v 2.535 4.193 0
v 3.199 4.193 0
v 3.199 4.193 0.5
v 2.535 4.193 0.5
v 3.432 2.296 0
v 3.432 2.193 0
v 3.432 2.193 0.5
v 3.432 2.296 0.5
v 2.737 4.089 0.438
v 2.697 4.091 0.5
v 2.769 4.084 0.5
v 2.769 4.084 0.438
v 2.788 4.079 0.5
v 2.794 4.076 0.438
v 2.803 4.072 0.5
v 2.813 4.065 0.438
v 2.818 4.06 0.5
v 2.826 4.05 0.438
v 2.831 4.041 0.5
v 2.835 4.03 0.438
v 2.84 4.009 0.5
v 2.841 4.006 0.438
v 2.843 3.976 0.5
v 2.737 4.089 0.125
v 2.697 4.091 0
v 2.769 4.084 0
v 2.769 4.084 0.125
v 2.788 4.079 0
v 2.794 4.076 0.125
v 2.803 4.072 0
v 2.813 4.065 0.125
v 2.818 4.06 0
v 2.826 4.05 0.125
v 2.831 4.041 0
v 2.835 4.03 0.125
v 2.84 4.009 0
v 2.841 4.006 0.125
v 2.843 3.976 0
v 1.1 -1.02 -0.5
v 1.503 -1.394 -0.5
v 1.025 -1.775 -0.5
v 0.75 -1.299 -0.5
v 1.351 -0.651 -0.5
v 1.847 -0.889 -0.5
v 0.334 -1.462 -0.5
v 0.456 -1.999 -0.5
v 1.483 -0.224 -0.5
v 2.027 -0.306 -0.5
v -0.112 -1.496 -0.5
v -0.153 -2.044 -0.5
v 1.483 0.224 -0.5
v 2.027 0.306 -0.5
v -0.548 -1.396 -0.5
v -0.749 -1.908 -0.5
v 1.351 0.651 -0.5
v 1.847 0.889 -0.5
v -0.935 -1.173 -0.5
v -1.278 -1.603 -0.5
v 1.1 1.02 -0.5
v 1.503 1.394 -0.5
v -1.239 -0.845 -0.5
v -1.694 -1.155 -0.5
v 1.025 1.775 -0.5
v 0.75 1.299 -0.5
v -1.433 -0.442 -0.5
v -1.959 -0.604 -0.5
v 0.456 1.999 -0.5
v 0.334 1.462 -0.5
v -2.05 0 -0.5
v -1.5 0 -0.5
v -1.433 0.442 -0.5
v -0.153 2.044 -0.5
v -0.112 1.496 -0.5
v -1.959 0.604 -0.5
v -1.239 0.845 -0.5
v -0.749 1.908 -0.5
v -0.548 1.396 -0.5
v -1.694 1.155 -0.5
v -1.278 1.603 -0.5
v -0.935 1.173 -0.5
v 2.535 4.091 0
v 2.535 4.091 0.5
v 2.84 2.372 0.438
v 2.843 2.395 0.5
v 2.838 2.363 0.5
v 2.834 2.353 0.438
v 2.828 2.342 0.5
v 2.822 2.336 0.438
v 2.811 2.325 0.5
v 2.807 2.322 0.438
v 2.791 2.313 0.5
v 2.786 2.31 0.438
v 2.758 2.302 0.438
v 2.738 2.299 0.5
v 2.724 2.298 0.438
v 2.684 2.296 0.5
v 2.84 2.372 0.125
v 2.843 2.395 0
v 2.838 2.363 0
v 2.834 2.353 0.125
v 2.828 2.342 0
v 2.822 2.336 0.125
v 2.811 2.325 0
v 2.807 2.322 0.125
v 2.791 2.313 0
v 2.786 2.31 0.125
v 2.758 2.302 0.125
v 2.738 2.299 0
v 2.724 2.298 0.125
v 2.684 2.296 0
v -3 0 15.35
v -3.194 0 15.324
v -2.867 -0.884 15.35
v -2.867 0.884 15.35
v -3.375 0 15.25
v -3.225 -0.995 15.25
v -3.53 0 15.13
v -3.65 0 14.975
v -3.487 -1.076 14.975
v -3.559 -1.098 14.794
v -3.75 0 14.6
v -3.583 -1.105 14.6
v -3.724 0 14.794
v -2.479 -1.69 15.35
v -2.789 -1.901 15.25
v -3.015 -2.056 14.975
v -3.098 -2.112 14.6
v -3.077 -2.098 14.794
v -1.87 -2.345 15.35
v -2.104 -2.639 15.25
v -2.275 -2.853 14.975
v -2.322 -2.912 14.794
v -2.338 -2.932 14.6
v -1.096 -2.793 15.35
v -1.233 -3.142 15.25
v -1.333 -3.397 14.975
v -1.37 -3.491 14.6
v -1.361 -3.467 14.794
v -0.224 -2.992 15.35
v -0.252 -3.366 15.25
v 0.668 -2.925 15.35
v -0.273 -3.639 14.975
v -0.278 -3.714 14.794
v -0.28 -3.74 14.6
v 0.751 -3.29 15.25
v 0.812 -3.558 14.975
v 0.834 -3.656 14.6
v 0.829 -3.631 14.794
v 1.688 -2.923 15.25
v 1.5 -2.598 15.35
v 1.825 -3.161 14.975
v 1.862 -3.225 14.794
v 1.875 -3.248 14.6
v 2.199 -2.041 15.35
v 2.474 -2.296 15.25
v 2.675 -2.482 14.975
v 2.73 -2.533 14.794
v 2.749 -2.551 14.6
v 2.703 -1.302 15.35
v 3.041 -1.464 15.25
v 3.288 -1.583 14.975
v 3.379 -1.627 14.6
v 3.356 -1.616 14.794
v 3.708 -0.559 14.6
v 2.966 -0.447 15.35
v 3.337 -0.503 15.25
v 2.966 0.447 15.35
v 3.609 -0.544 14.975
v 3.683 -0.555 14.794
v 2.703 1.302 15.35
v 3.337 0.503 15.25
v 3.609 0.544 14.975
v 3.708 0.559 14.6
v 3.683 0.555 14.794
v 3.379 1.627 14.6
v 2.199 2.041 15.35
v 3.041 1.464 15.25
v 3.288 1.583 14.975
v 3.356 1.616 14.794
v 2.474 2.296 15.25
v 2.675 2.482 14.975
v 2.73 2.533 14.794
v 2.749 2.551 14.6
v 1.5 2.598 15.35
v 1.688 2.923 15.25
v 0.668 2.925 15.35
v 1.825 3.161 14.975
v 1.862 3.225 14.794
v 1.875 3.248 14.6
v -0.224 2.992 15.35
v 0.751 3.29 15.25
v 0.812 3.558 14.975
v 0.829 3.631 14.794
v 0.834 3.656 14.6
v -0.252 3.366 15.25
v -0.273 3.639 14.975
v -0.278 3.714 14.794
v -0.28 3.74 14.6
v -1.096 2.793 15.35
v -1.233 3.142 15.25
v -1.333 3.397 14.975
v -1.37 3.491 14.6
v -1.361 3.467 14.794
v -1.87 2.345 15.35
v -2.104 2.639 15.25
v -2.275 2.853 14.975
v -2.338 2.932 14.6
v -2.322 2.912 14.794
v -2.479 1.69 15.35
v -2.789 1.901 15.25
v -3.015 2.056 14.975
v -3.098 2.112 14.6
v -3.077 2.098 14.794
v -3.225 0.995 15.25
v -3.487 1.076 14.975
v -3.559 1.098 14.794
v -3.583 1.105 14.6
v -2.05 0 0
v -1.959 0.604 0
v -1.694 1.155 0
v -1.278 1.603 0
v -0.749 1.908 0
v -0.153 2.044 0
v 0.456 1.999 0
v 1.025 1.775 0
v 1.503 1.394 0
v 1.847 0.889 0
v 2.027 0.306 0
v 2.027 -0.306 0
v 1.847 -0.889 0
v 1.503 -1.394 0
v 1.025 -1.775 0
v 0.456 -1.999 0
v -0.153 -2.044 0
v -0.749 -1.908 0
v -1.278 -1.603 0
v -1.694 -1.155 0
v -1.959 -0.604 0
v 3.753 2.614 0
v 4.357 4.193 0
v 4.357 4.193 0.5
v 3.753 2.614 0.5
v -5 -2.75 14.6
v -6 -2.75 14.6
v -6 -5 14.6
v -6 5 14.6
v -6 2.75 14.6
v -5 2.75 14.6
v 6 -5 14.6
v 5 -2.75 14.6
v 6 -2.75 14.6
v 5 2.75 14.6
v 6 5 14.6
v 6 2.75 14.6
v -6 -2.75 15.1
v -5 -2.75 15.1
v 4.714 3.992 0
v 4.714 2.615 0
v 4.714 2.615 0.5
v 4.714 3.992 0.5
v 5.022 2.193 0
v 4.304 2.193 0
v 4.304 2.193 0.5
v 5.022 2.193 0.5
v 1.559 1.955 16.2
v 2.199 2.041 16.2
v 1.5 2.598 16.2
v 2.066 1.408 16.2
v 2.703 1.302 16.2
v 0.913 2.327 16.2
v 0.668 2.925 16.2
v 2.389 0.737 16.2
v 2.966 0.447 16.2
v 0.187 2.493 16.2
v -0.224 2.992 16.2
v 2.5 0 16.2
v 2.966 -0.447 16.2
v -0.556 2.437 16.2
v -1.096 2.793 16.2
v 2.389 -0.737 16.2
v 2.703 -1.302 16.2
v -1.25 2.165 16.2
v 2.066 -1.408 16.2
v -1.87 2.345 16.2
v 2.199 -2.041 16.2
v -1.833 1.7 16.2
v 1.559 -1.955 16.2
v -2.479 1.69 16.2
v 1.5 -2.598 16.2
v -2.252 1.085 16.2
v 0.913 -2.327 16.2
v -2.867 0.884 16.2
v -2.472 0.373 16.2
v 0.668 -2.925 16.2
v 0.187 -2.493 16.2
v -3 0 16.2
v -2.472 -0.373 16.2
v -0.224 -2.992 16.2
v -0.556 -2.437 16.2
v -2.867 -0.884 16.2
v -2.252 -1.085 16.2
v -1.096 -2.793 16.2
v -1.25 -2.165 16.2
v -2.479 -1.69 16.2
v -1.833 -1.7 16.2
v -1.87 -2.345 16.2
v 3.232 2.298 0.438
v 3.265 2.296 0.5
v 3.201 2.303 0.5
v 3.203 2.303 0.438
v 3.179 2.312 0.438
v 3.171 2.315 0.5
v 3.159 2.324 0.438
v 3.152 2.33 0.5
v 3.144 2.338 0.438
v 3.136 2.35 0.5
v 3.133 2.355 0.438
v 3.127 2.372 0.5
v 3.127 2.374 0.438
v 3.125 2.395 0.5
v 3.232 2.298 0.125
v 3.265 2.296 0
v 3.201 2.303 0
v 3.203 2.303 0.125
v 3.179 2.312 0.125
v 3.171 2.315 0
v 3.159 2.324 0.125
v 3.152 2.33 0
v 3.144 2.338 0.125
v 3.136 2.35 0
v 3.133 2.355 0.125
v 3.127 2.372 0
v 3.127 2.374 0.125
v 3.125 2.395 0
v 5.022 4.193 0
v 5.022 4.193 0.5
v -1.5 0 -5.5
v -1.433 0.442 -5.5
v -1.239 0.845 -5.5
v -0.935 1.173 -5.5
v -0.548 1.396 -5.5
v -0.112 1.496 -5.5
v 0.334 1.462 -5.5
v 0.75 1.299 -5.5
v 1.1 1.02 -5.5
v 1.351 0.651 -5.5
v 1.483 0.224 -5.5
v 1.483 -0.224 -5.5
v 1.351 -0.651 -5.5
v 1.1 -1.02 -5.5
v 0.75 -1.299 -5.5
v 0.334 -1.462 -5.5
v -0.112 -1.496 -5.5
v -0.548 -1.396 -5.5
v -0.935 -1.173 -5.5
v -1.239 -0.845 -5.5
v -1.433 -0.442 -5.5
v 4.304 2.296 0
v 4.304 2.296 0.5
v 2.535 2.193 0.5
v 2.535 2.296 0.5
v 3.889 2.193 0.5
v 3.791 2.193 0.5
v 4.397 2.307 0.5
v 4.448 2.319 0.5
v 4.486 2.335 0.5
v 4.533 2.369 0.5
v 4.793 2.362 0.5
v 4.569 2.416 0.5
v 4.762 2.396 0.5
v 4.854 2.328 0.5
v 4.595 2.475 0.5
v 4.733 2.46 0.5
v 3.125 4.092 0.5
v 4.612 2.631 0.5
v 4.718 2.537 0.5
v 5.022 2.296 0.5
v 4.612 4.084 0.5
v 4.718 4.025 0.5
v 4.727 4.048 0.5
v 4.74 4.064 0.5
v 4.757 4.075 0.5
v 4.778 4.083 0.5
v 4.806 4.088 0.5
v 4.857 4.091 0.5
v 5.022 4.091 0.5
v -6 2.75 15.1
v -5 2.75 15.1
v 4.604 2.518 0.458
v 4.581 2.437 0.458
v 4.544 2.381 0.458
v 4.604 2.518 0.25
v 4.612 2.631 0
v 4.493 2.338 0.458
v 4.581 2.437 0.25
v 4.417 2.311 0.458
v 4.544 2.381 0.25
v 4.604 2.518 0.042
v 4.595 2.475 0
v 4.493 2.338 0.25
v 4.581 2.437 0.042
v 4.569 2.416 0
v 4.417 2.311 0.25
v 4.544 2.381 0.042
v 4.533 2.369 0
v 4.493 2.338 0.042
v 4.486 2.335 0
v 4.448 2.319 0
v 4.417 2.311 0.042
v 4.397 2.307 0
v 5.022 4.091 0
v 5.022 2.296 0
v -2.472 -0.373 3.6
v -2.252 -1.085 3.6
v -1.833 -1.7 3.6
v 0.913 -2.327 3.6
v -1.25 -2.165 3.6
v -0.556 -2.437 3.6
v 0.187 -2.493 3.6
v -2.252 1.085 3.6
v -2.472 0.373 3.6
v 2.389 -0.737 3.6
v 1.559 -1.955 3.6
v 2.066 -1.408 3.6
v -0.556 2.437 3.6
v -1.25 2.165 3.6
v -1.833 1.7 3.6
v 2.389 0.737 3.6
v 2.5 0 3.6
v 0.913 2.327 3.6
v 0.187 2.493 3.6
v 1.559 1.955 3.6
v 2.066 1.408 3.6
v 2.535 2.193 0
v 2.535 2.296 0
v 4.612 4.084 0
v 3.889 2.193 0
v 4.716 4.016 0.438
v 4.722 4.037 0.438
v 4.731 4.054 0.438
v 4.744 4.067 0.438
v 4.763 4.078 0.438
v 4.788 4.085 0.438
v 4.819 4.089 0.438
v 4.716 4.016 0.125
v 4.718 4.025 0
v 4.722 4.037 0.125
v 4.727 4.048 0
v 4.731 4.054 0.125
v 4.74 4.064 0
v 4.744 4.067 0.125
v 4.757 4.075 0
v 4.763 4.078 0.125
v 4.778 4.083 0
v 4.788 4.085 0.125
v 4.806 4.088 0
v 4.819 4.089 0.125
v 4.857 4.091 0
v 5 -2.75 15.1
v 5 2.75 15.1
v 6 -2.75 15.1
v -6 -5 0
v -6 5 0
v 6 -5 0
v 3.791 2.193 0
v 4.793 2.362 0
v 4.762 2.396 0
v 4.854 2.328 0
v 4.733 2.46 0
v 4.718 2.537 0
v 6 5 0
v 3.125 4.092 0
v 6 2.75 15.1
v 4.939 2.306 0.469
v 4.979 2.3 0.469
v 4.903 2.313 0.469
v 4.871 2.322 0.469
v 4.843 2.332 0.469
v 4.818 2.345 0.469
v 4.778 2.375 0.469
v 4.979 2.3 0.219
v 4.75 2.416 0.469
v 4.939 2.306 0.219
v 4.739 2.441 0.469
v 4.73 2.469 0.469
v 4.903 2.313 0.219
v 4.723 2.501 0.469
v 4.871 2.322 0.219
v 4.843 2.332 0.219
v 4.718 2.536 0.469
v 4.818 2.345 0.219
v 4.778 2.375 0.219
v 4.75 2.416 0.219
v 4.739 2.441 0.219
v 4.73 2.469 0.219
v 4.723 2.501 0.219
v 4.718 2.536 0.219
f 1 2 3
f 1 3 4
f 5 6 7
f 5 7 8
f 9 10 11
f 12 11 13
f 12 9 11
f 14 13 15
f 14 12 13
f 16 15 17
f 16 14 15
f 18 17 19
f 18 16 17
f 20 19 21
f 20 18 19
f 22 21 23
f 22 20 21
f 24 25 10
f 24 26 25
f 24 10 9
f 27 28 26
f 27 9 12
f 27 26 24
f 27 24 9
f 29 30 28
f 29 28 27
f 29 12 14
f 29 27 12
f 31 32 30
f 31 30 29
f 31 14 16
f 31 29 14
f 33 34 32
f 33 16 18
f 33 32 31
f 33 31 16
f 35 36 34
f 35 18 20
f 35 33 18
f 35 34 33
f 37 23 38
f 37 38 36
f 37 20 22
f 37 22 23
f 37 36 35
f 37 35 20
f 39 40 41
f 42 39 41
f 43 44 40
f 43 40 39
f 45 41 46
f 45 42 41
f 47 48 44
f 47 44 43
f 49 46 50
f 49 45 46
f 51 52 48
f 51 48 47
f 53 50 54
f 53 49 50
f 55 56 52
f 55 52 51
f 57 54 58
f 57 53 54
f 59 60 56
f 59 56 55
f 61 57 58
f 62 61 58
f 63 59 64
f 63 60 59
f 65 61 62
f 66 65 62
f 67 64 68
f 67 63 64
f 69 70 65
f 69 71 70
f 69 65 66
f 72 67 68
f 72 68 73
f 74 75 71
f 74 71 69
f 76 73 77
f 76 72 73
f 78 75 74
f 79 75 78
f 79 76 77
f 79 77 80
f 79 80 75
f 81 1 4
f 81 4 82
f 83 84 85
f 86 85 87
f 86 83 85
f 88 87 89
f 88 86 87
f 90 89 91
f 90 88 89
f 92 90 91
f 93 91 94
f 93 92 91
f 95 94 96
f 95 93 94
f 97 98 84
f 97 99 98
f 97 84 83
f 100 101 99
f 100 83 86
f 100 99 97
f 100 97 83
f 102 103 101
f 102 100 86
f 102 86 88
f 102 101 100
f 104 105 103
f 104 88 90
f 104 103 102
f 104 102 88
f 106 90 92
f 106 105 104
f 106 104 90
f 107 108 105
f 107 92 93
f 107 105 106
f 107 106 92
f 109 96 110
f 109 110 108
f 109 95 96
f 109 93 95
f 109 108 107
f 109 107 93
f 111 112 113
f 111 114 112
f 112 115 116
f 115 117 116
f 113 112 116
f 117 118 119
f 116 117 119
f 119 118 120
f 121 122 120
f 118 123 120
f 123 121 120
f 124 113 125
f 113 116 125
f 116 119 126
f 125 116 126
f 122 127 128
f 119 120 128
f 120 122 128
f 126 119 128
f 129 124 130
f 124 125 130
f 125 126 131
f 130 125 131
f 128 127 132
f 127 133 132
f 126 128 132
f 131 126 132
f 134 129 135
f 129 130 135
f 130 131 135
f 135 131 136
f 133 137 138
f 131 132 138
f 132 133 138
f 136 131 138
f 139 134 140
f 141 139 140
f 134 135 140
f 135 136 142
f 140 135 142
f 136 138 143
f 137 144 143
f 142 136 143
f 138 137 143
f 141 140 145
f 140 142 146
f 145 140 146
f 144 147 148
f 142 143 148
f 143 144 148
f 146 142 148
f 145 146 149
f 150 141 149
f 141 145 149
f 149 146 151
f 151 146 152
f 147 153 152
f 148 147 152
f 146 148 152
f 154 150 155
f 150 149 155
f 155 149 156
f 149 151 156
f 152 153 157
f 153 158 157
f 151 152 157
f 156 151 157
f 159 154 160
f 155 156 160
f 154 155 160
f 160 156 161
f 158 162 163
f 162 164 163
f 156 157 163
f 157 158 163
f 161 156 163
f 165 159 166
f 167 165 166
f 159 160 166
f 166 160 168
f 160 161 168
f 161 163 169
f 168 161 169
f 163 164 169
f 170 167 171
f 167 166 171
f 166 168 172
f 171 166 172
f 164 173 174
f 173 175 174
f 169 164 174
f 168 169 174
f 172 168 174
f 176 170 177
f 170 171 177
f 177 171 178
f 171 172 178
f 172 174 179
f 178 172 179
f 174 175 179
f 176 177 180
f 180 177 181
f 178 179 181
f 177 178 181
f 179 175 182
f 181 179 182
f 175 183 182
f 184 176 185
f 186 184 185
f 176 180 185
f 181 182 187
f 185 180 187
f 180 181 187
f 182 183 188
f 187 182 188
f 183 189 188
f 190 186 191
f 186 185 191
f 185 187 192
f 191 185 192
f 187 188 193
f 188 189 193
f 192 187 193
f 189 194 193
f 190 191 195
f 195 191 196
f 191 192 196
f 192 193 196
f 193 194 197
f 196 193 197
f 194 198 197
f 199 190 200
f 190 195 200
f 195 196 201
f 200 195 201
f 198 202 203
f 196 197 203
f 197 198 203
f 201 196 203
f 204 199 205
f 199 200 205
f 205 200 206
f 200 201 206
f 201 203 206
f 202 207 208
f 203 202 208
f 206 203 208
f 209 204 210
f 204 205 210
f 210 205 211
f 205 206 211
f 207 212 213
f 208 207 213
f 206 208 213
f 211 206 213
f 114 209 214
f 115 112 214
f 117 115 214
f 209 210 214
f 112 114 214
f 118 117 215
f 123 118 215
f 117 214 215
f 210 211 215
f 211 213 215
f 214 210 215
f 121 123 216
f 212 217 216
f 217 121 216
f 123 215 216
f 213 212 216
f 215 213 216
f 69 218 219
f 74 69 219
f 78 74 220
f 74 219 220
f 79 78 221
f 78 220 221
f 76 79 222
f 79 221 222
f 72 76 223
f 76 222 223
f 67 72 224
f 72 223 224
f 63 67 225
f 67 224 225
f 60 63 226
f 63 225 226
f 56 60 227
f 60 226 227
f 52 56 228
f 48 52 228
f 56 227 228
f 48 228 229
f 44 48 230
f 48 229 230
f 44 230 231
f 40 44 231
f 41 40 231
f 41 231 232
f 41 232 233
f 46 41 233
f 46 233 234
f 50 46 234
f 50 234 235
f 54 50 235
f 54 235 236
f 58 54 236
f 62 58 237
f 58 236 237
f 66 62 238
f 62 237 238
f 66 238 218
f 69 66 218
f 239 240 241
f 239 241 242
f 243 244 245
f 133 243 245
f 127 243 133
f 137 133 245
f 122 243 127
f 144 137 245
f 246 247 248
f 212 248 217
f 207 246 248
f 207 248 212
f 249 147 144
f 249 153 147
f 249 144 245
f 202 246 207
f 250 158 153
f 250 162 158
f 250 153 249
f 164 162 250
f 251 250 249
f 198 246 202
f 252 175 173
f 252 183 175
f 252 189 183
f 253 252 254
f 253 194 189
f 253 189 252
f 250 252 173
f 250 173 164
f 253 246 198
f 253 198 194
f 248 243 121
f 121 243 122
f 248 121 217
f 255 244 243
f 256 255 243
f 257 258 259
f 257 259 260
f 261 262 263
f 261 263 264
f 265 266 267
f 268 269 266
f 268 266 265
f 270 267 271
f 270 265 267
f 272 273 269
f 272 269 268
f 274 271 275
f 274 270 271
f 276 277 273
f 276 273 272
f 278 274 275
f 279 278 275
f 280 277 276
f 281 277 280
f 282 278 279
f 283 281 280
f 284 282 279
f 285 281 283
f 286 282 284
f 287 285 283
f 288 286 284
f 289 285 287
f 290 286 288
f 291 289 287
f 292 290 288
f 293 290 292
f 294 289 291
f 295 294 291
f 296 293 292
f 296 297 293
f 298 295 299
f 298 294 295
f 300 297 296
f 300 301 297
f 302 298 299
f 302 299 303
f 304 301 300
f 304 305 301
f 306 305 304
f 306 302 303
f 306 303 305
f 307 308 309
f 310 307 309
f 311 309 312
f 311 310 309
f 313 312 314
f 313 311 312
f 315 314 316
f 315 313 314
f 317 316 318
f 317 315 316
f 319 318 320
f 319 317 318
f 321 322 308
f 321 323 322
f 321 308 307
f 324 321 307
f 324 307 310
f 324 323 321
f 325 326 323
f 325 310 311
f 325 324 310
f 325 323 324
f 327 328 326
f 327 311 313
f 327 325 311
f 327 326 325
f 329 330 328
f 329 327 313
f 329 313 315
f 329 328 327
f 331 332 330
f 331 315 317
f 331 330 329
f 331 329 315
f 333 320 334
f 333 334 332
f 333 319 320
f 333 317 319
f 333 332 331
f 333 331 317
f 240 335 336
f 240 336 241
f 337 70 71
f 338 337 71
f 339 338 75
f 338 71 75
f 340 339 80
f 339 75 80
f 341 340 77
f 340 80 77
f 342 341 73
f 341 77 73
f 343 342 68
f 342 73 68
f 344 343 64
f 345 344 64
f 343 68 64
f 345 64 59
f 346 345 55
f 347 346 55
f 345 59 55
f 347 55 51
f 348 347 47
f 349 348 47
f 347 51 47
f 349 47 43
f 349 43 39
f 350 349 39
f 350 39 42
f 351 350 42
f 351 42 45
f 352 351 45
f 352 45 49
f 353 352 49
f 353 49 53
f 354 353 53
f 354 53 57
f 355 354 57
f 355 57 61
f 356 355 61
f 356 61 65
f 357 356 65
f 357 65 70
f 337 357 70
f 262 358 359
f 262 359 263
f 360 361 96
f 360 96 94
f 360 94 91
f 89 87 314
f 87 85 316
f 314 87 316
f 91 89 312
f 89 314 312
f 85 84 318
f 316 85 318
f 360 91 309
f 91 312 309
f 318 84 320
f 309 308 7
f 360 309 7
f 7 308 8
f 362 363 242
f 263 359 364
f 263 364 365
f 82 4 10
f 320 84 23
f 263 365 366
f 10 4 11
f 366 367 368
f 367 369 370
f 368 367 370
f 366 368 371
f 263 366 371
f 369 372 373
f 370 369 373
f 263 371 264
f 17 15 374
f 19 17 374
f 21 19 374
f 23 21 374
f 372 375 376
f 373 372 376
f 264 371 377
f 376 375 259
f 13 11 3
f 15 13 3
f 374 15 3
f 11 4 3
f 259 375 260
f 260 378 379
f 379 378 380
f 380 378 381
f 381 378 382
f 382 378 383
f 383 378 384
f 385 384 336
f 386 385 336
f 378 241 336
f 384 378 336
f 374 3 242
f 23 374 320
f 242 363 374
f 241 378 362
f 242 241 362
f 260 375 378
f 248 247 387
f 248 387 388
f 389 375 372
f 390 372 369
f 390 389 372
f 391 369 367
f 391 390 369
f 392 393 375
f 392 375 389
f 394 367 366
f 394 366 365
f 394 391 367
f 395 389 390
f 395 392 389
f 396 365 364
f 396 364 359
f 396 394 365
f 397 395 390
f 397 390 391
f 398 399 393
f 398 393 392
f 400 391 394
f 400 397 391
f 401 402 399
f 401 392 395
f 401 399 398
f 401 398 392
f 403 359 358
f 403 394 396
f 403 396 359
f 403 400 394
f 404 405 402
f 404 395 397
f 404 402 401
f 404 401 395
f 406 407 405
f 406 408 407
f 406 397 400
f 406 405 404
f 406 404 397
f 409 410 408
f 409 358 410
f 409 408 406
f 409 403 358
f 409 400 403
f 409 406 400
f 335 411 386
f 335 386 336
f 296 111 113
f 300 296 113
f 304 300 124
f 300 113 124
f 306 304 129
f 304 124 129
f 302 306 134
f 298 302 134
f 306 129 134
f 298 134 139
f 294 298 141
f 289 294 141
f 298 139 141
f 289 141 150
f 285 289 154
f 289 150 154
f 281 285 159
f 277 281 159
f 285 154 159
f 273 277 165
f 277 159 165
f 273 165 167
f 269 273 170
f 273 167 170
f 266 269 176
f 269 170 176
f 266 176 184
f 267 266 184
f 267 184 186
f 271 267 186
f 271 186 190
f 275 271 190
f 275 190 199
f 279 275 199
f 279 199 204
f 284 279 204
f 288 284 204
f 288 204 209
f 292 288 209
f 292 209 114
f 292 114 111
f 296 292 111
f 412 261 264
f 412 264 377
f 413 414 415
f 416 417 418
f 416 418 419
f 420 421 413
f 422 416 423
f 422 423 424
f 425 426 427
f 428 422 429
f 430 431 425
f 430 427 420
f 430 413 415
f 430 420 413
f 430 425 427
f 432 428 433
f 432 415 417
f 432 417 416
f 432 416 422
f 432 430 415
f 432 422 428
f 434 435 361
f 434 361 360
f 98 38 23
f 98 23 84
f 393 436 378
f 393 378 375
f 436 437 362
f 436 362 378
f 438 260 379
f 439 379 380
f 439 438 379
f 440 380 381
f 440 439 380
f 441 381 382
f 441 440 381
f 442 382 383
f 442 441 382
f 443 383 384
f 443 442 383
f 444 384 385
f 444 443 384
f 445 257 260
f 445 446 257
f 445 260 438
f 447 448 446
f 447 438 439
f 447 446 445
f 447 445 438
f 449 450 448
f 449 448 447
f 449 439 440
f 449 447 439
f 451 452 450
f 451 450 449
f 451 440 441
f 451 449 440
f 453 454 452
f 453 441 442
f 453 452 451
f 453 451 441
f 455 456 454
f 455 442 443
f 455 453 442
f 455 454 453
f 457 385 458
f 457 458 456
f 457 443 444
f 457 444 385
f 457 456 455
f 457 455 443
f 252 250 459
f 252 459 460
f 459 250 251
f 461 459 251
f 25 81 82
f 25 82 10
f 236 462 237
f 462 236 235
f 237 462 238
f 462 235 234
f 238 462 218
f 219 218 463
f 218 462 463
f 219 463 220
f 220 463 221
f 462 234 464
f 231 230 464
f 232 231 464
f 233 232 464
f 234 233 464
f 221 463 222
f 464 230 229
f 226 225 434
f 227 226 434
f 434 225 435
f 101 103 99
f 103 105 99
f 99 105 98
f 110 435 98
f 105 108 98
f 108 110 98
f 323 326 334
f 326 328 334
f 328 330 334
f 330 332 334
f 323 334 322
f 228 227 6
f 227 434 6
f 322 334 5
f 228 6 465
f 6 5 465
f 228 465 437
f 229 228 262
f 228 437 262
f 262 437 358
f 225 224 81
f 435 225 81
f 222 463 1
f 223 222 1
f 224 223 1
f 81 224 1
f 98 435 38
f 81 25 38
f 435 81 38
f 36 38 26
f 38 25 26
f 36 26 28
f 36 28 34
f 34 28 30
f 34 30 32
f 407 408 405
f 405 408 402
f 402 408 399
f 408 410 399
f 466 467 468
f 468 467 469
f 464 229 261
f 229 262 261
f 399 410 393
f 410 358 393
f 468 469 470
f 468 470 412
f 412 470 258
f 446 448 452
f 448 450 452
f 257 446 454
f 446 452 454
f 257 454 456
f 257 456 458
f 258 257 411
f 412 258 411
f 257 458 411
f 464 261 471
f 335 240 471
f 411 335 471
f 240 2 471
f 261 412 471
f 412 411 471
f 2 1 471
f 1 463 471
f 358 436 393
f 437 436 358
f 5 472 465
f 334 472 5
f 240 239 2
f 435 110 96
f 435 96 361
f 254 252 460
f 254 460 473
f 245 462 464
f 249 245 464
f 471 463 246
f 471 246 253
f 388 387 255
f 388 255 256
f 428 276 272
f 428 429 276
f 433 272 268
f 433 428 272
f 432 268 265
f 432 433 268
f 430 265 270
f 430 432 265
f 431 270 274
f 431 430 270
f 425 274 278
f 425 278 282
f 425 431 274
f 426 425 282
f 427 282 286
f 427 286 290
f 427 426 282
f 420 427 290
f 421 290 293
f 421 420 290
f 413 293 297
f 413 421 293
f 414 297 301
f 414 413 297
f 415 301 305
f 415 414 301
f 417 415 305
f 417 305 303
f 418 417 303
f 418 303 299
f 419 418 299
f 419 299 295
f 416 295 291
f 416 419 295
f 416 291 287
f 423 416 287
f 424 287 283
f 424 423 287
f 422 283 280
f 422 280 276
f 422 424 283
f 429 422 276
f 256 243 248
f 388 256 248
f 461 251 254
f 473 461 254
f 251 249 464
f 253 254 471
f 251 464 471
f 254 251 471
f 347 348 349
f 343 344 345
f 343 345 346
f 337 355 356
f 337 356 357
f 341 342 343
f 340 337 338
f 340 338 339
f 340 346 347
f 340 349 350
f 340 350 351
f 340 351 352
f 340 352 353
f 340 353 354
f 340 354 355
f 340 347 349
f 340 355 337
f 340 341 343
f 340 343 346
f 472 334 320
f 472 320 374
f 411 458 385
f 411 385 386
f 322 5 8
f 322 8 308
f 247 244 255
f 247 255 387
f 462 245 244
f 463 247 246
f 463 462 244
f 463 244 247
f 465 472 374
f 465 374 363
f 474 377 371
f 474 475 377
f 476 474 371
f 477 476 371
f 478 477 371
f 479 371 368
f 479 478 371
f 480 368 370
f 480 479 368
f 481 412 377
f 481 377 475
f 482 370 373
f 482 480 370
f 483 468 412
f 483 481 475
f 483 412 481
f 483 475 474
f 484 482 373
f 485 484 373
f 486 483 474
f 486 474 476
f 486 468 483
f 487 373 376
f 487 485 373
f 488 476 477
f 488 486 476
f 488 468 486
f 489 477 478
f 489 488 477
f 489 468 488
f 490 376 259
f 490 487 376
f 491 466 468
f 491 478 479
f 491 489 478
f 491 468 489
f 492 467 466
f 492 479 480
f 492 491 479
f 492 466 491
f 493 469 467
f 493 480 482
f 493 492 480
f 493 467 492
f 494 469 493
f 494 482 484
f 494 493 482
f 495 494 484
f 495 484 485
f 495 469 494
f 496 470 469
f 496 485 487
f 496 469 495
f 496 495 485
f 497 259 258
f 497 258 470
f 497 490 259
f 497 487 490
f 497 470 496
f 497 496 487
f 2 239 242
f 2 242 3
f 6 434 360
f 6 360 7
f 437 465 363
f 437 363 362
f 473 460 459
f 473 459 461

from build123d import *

# Parameters (mm, degrees)
SKETCH1_W           = 12
SKETCH1_H           = 10
BOSS_EXTRUDE1_DEPTH = 14.6
SKETCH2_W           = 1
SKETCH2_H           = 5.5
BOSS_EXTRUDE2_DEPTH = 0.5
SKETCH4_R           = 1.5
BOSS_EXTRUDE3_DEPTH = 5.5
SKETCH5_R           = 2.05
BOSS_EXTRUDE4_DEPTH = 0.5
CUT_EXTRUDE1_DEPTH  = 0.5
SKETCH7_R           = 2.5
CUT_EXTRUDE2_DEPTH  = 11
SKETCH9_R           = 3
SKETCH9_R_2         = 2.5
BOSS_EXTRUDE5_DEPTH = 1.6


with BuildPart() as part:
    # Sketch1 → Boss-Extrude1 (new body)
    with BuildSketch(Plane.XY):
        Rectangle(SKETCH1_W, SKETCH1_H)
    extrude(amount=BOSS_EXTRUDE1_DEPTH)

    # Sketch2 → Boss-Extrude2 (add)
    with BuildSketch(Plane.XY.offset(14.6)):
        with Locations((-5.5, 0)):
            Rectangle(SKETCH2_W, SKETCH2_H)
        with Locations((5.5, 0)):
            Rectangle(SKETCH2_W, SKETCH2_H)
    extrude(amount=BOSS_EXTRUDE2_DEPTH)

    # Sketch4 → Boss-Extrude3 (add)
    with BuildSketch(Plane(origin=(0, 0, 0), x_dir=(-1, 0, 0), z_dir=(0, 0, -1))):
        Circle(SKETCH4_R)
    extrude(amount=BOSS_EXTRUDE3_DEPTH)

    # Sketch5 → Boss-Extrude4 (add)
    with BuildSketch(Plane(origin=(0, 0, 0), x_dir=(-1, 0, 0), z_dir=(0, 0, -1))):
        Circle(SKETCH5_R)
    extrude(amount=BOSS_EXTRUDE4_DEPTH)

    # Sketch6 → Cut-Extrude1 (cut)
    with BuildSketch(Plane(origin=(0, 0, 0), x_dir=(-1, 0, 0), z_dir=(0, 0, -1))):
        with BuildLine():
            Line((-5.022000054, 4.19344844), (-4.356935952, 4.19344844))
            Line((-4.356935952, 4.19344844), (-3.752769285, 2.614121517))
            Line((-3.752769285, 2.614121517), (-3.198682747, 4.19344844))
            Line((-3.198682747, 4.19344844), (-2.534820567, 4.19344844))
            Line((-2.534820567, 4.19344844), (-2.534820567, 4.090884337))
            Line((-2.534820567, 4.090884337), (-2.697080183, 4.090884337))
            add(Edge.make_bspline(
                [(-2.697080183, 4.090884337), (-2.710316809, 4.090636556), (-2.734492679, 4.090183998), (-2.76728752, 4.085652982), (-2.793244282, 4.077989549), (-2.813274161, 4.066597021), (-2.826894921, 4.049870677), (-2.8359508, 4.029264042), (-2.841554988, 4.004099098), (-2.842176045, 3.985816116), (-2.842512875, 3.975900363)],
                knots=[0, 0, 0, 0, 1.461409083, 2.669172297, 3.644102285, 4.438396511, 5.171145089, 5.982913306, 6.9060355, 8, 8, 8, 8], degree=3))
            Line((-2.842512875, 3.975900363), (-2.842512875, 2.394570235))
            add(Edge.make_bspline(
                [(-2.842512875, 2.394570235), (-2.842050819, 2.387038144), (-2.841173668, 2.372739479), (-2.834447891, 2.352433769), (-2.823099881, 2.334952111), (-2.806557353, 2.320282642), (-2.784561689, 2.309069969), (-2.756555778, 2.301303429), (-2.722335078, 2.296750977), (-2.697362885, 2.296271709), (-2.683859029, 2.296012542)],
                knots=[0, 0, 0, 0, 0.852734016, 1.618801414, 2.395714484, 3.189123744, 4.096684287, 5.169862416, 6.469586829, 8, 8, 8, 8], degree=3))
            Line((-2.683859029, 2.296012542), (-2.534820567, 2.296012542))
            Line((-2.534820567, 2.296012542), (-2.534820567, 2.19344844))
            Line((-2.534820567, 2.19344844), (-3.432256465, 2.19344844))
            Line((-3.432256465, 2.19344844), (-3.432256465, 2.296012542))
            Line((-3.432256465, 2.296012542), (-3.265189157, 2.296012542))
            add(Edge.make_bspline(
                [(-3.265189157, 2.296012542), (-3.253950106, 2.296245463), (-3.232932895, 2.296681029), (-3.203686174, 2.301738527), (-3.179094381, 2.310536297), (-3.158974617, 2.322618715), (-3.143443119, 2.337663858), (-3.132382481, 2.354803918), (-3.125466503, 2.374031717), (-3.124871883, 2.387565999), (-3.124564157, 2.394570235)],
                knots=[0, 0, 0, 0, 1.394235928, 2.607244209, 3.666761408, 4.619311681, 5.498637875, 6.326439516, 7.133902247, 8, 8, 8, 8], degree=3))
            Line((-3.124564157, 2.394570235), (-3.124564157, 4.09208626))
            Line((-3.124564157, 4.09208626), (-3.791230824, 2.19344844))
            Line((-3.791230824, 2.19344844), (-3.888987234, 2.19344844))
            Line((-3.888987234, 2.19344844), (-4.611743644, 4.08407344))
            Line((-4.611743644, 4.08407344), (-4.611743644, 2.631349081))
            add(Edge.make_bspline(
                [(-4.611743644, 2.631349081), (-4.611377469, 2.611036444), (-4.610694083, 2.573127352), (-4.605325483, 2.520247499), (-4.596108802, 2.475353065), (-4.582524113, 2.437834201), (-4.564432022, 2.407070341), (-4.544422056, 2.379994045), (-4.520414227, 2.357133819), (-4.492696269, 2.33684315), (-4.45794728, 2.320895889), (-4.41471004, 2.309573563), (-4.362603697, 2.300270875), (-4.324529352, 2.297501845), (-4.304051336, 2.296012542)],
                knots=[0, 0, 0, 0, 1.387005521, 2.588542367, 3.624266538, 4.510231893, 5.298685798, 6.05383917, 6.802021236, 7.553697037, 8.390065714, 9.394768359, 10.598794723, 12, 12, 12, 12], degree=3))
            Line((-4.304051336, 2.296012542), (-4.304051336, 2.19344844))
            Line((-4.304051336, 2.19344844), (-5.022000054, 2.19344844))
            Line((-5.022000054, 2.19344844), (-5.022000054, 2.296012542))
            add(Edge.make_bspline(
                [(-5.022000054, 2.296012542), (-5.007558595, 2.297187721), (-4.97993619, 2.299435504), (-4.940384187, 2.30521534), (-4.904363952, 2.311965762), (-4.872178394, 2.321630139), (-4.843002284, 2.331333401), (-4.818185115, 2.344714342), (-4.796055659, 2.35825151), (-4.778051671, 2.375035374), (-4.762204772, 2.393739353), (-4.7498382, 2.416205607), (-4.738151387, 2.44116405), (-4.729866044, 2.469901954), (-4.722344359, 2.501519512), (-4.718026847, 2.536578835), (-4.714468033, 2.57465227), (-4.714362538, 2.601157074), (-4.714307747, 2.614922799)],
                knots=[0, 0, 0, 0, 1.3499974, 2.582161247, 3.724551801, 4.760625632, 5.713431081, 6.581852865, 7.382807722, 8.122943763, 8.865587329, 9.657594863, 10.504338807, 11.429508857, 12.438001628, 13.531119739, 14.71774469, 16, 16, 16, 16], degree=3))
            Line((-4.714307747, 2.614922799), (-4.714307747, 3.992326645))
            add(Edge.make_bspline(
                [(-4.714307747, 3.992326645), (-4.714667267, 4.000376864), (-4.71534259, 4.015498393), (-4.720947722, 4.036459034), (-4.730366107, 4.054081799), (-4.74431361, 4.06851761), (-4.763922895, 4.079141723), (-4.789389281, 4.085827056), (-4.821001443, 4.090114928), (-4.844231256, 4.090612312), (-4.856935952, 4.090884337)],
                knots=[0, 0, 0, 0, 0.964066467, 1.810902258, 2.577654402, 3.336338785, 4.182417323, 5.216170427, 6.47748631, 8, 8, 8, 8], degree=3))
            Line((-4.856935952, 4.090884337), (-5.022000054, 4.090884337))
            Line((-5.022000054, 4.090884337), (-5.022000054, 4.19344844))
        make_face()
    extrude(amount=-CUT_EXTRUDE1_DEPTH, mode=Mode.SUBTRACT)

    # Sketch7 → Cut-Extrude2 (cut)
    with BuildSketch(Plane.XY.offset(14.6)):
        Circle(SKETCH7_R)
    extrude(amount=-CUT_EXTRUDE2_DEPTH, mode=Mode.SUBTRACT)

    # Sketch9 → Boss-Extrude5 (add)
    with BuildSketch(Plane.XY.offset(14.6)):
        with Locations(Location((0, 0, 0), (0, 0, 180))):
            Circle(SKETCH9_R)
        Circle(SKETCH9_R_2, mode=Mode.SUBTRACT)
    extrude(amount=BOSS_EXTRUDE5_DEPTH)

    # Sketch10 → Revolve1 (revolve)
    with BuildSketch(Plane(origin=(0, 0, 0), x_dir=(1, 0, 0), z_dir=(0, 1, 0)), mode=Mode.PRIVATE) as revolve1_sk:
        with BuildLine():
            Line((3.75, -14.6), (3, -14.6))
            Line((3, -14.6), (3, -15.35))
            ThreePointArc((3, -15.35), (3.530330086, -15.130330086), (3.75, -14.6))
        make_face()
    revolve(revolve1_sk.sketch.rotate(Axis((0, 0, 3.6), (0, 0, 1)), 180), axis=Axis((0, 0, 3.6), (0, 0, 1)))


solid = part.part
